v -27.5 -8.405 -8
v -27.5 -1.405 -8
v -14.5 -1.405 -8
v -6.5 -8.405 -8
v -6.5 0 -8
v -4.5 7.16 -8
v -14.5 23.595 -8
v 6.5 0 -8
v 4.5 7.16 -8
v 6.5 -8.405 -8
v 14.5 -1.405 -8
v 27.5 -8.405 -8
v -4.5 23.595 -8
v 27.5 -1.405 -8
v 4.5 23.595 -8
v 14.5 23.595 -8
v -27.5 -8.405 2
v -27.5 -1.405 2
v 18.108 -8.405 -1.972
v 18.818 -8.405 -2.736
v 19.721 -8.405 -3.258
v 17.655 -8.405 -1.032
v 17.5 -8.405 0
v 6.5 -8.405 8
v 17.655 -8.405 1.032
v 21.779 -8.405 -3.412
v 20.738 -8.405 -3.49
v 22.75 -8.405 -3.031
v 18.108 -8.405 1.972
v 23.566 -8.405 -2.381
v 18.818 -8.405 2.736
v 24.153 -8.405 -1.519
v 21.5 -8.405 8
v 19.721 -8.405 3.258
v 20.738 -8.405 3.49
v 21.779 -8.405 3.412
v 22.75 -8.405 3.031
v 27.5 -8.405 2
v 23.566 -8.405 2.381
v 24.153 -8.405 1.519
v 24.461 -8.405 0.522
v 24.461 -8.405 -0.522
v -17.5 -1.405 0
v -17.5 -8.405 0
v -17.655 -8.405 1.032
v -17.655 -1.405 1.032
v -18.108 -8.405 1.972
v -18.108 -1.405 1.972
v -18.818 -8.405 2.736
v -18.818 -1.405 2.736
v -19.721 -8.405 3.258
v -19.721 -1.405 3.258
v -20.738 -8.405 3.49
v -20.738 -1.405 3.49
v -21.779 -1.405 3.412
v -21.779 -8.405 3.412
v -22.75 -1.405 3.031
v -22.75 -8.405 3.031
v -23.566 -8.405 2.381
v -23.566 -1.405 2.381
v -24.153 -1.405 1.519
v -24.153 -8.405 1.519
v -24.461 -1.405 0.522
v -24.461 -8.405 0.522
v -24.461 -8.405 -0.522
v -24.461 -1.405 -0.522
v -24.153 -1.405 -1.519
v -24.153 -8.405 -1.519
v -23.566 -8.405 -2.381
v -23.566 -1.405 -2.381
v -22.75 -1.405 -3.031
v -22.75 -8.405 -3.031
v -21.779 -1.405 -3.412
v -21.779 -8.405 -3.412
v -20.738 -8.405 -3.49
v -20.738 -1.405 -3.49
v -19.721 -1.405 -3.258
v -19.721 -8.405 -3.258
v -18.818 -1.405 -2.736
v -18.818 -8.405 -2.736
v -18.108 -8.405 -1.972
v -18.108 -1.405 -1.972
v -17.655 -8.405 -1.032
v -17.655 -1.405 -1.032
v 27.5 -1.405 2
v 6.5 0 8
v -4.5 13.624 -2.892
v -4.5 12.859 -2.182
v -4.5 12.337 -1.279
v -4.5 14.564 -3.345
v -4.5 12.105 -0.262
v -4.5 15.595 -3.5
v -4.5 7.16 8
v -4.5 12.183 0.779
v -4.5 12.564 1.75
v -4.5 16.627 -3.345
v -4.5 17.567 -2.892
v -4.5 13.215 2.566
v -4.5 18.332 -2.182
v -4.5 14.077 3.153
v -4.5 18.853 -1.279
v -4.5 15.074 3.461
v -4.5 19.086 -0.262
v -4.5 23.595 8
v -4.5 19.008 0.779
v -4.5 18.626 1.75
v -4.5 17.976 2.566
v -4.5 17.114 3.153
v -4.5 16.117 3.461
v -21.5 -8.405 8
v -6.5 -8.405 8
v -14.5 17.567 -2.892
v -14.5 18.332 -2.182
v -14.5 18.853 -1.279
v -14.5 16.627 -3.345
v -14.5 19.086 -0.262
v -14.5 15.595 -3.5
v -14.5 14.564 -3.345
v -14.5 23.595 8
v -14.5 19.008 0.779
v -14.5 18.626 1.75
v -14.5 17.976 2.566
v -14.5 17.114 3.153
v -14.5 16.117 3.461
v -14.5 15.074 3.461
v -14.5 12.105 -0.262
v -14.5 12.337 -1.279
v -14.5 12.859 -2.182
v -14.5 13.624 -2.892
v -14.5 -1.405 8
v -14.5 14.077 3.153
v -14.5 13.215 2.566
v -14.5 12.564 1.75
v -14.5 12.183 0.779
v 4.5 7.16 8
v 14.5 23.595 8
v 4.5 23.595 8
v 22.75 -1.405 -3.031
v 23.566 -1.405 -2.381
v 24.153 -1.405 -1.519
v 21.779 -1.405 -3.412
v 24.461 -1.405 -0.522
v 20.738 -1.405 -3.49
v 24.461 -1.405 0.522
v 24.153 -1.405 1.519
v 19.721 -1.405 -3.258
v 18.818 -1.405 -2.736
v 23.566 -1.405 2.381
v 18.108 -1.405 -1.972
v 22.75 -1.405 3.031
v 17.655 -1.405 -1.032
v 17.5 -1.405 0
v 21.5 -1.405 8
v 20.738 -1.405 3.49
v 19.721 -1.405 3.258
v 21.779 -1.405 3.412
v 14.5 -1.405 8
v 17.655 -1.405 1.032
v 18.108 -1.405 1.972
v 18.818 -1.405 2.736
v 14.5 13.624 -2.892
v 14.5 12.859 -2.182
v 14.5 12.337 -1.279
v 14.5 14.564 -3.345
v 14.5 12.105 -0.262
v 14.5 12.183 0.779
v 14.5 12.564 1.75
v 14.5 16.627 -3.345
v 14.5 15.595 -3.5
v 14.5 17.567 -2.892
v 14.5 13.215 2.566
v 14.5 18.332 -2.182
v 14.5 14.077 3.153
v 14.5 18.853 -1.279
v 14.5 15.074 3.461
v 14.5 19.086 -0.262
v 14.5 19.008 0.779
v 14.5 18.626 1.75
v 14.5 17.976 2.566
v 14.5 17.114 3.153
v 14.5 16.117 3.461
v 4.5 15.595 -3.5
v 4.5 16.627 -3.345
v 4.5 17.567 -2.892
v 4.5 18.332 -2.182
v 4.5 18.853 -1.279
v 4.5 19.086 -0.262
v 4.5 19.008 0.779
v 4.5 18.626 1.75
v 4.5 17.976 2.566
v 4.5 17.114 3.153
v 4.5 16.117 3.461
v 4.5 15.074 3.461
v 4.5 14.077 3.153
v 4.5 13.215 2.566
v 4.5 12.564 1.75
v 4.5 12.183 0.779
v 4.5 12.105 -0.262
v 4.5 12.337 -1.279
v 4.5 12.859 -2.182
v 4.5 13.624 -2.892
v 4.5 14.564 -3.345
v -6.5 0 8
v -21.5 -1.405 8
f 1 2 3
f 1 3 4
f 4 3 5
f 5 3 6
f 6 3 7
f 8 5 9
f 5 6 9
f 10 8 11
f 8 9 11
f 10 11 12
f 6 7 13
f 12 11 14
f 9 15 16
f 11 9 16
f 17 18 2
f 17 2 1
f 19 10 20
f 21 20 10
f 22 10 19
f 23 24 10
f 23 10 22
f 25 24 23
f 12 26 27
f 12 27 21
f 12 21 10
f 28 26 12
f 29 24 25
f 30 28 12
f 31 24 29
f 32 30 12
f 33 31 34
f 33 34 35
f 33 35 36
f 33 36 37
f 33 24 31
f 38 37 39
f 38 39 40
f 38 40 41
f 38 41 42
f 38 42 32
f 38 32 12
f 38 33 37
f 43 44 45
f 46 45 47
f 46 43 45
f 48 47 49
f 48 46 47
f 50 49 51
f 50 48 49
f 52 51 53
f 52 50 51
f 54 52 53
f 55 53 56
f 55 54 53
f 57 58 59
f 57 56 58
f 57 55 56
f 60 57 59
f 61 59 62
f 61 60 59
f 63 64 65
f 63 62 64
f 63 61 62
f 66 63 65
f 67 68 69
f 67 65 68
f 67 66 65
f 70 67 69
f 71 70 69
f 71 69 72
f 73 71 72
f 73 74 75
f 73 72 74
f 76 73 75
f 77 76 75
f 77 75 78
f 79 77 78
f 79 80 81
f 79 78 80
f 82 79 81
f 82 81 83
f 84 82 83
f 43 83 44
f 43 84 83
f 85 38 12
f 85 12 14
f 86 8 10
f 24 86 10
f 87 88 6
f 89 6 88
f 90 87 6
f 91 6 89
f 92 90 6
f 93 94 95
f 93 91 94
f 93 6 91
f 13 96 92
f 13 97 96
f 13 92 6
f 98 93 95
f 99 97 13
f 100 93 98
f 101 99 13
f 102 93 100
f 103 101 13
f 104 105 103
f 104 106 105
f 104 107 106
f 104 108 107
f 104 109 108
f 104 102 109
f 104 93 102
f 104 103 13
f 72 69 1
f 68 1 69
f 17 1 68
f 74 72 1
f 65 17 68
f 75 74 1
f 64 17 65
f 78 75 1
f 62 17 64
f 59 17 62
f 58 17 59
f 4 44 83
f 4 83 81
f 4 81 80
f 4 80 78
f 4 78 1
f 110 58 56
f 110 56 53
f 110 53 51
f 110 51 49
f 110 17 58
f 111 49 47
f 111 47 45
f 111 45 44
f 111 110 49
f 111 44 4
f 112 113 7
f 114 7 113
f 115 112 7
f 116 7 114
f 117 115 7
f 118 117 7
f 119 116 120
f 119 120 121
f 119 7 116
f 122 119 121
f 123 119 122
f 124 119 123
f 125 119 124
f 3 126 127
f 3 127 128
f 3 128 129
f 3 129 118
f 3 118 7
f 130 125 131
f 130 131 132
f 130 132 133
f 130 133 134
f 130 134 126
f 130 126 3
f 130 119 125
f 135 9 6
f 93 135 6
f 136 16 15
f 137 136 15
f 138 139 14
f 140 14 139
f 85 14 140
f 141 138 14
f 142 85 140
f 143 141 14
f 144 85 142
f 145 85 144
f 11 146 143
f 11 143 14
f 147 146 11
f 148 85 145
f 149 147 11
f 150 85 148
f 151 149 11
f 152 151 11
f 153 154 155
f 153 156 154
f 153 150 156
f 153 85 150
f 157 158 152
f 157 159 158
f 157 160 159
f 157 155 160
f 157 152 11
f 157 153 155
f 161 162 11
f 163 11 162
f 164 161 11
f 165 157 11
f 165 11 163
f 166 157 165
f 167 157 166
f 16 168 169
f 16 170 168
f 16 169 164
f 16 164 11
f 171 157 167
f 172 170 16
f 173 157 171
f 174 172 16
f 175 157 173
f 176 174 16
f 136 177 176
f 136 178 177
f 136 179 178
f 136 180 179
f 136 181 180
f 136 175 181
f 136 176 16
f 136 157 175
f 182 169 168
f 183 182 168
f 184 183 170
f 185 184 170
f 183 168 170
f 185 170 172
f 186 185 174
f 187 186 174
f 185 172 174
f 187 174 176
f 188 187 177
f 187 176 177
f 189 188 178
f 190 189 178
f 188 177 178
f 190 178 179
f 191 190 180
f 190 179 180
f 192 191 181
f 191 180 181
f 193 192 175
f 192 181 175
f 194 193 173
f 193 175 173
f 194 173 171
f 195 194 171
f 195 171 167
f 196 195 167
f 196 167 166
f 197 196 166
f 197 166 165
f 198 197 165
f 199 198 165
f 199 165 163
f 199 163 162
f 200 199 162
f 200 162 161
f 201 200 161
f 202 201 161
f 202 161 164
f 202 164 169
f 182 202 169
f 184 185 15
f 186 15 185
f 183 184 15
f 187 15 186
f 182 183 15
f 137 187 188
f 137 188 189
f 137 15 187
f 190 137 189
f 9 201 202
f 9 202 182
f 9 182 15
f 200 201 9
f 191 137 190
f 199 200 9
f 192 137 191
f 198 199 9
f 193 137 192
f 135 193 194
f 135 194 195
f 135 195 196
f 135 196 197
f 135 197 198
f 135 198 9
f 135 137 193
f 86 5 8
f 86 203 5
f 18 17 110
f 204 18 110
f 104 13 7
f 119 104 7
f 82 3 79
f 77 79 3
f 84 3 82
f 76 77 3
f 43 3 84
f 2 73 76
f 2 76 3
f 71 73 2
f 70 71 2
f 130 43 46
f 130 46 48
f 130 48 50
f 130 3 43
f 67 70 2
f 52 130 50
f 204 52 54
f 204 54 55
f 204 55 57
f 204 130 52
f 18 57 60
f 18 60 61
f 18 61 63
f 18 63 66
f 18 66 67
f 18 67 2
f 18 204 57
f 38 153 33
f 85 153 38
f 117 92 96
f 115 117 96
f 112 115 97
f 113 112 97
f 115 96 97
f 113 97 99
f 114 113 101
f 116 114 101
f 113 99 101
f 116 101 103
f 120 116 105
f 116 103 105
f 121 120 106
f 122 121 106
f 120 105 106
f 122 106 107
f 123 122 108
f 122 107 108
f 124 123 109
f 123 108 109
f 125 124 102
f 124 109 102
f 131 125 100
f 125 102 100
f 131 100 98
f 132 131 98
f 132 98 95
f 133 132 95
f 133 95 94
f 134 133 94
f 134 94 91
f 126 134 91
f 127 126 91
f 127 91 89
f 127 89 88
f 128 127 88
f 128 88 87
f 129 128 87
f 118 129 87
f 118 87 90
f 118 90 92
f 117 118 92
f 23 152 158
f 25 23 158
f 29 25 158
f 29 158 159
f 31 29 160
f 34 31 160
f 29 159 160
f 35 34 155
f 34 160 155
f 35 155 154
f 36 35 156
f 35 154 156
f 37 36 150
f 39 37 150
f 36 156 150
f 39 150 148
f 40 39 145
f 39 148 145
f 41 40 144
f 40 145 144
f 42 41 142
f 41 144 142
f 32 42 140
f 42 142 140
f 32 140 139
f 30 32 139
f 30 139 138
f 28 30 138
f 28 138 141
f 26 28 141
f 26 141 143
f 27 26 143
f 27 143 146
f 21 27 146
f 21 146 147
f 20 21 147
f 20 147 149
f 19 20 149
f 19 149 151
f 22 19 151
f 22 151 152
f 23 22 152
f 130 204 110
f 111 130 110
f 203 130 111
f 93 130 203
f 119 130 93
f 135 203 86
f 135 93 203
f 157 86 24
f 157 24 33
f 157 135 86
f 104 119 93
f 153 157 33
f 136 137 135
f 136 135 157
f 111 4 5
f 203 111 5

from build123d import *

# Parameters (mm, degrees)
BOSS_EXTRUDE1_DEPTH = 8
CHAMFER2_START      = 20.859650045
CHAMFER2_OUTLINE_W  = 12
CHAMFER2_OUTLINE_H  = 7
CHAMFER2_DEPTH      = 5.140349955
CHAMFER3_START      = -26
CHAMFER3_OUTLINE_W  = 12
CHAMFER3_OUTLINE_H  = 7
CHAMFER3_DEPTH      = 5.140349955
SKETCH2_R           = 3.5
CUT_EXTRUDE1_DEPTH  = 16
SKETCH3_R           = 3.5
CUT_EXTRUDE2_DEPTH  = 49.833796009


with BuildPart() as part:
    # Sketch1 → Boss-Extrude1 (new, symmetric)
    with BuildSketch(Plane.XY):
        Polygon((-6.5, 0), (6.5, 0), (6.5, -8.404669261), (27.5, -8.404669261), (27.5, -1.404669261), (14.5, -1.404669261), (14.5, 23.595330739), (4.5, 23.595330739), (4.5, 7.159533074), (-4.5, 7.159533074), (-4.5, 23.595330739), (-14.5, 23.595330739), (-14.5, -1.404669261), (-27.5, -1.404669261), (-27.5, -8.404669261), (-6.5, -8.404669261), align=None)
    extrude(amount=BOSS_EXTRUDE1_DEPTH, both=True)

    # Chamfer2: read off the stored shape, not the designer's step
    # Chamfer2 outline → Chamfer2 (cut)
    with BuildSketch(Plane(origin=(0, 0, 0), x_dir=(0.7071067811865474, 0, -0.7071067811865477), z_dir=(0.7071067811865476, 0, 0.7071067811865476)).offset(CHAMFER2_START)):
        with Locations((14, -4.904669261)):
            Rectangle(CHAMFER2_OUTLINE_W, CHAMFER2_OUTLINE_H)
    extrude(amount=CHAMFER2_DEPTH, mode=Mode.SUBTRACT)

    # Chamfer3: read off the stored shape, not the designer's step
    # Chamfer3 outline → Chamfer3 (cut)
    with BuildSketch(Plane(origin=(0, 0, 0), x_dir=(0.707106781186548, 0, 0.707106781186547), z_dir=(0.707106781186547, 0, -0.707106781186548)).offset(CHAMFER3_START)):
        with Locations((-14, 4.904669261)):
            Rectangle(CHAMFER3_OUTLINE_W, CHAMFER3_OUTLINE_H)
    extrude(amount=CHAMFER3_DEPTH, mode=Mode.SUBTRACT)

    # Sketch2 → Cut-Extrude1 (cut)
    with BuildSketch(Plane(origin=(0, -1.404669261, 0), x_dir=(1, 0, 0), z_dir=(0, 1, 0))):
        with Locations(Location((21, 0, 0), (0, 0, 180))):
            Circle(SKETCH2_R)
    cut_extrude1 = extrude(amount=-CUT_EXTRUDE1_DEPTH, mode=Mode.SUBTRACT)

    # Mirror1: Cut-Extrude1 across plane
    add(cut_extrude1.mirror(Plane(origin=(0, 0, 0), x_dir=(0, 0, 1), z_dir=(1, 0, 0))), mode=Mode.SUBTRACT)

    # Sketch3 → Cut-Extrude2 (cut, through all)
    with BuildSketch(Plane(origin=(14.5, 0, 0), x_dir=(0, 0, -1), z_dir=(1, 0, 0))):
        with Locations((0, 15.595330739)):
            Circle(SKETCH3_R)
    extrude(amount=-CUT_EXTRUDE2_DEPTH, mode=Mode.SUBTRACT)


solid = part.part
